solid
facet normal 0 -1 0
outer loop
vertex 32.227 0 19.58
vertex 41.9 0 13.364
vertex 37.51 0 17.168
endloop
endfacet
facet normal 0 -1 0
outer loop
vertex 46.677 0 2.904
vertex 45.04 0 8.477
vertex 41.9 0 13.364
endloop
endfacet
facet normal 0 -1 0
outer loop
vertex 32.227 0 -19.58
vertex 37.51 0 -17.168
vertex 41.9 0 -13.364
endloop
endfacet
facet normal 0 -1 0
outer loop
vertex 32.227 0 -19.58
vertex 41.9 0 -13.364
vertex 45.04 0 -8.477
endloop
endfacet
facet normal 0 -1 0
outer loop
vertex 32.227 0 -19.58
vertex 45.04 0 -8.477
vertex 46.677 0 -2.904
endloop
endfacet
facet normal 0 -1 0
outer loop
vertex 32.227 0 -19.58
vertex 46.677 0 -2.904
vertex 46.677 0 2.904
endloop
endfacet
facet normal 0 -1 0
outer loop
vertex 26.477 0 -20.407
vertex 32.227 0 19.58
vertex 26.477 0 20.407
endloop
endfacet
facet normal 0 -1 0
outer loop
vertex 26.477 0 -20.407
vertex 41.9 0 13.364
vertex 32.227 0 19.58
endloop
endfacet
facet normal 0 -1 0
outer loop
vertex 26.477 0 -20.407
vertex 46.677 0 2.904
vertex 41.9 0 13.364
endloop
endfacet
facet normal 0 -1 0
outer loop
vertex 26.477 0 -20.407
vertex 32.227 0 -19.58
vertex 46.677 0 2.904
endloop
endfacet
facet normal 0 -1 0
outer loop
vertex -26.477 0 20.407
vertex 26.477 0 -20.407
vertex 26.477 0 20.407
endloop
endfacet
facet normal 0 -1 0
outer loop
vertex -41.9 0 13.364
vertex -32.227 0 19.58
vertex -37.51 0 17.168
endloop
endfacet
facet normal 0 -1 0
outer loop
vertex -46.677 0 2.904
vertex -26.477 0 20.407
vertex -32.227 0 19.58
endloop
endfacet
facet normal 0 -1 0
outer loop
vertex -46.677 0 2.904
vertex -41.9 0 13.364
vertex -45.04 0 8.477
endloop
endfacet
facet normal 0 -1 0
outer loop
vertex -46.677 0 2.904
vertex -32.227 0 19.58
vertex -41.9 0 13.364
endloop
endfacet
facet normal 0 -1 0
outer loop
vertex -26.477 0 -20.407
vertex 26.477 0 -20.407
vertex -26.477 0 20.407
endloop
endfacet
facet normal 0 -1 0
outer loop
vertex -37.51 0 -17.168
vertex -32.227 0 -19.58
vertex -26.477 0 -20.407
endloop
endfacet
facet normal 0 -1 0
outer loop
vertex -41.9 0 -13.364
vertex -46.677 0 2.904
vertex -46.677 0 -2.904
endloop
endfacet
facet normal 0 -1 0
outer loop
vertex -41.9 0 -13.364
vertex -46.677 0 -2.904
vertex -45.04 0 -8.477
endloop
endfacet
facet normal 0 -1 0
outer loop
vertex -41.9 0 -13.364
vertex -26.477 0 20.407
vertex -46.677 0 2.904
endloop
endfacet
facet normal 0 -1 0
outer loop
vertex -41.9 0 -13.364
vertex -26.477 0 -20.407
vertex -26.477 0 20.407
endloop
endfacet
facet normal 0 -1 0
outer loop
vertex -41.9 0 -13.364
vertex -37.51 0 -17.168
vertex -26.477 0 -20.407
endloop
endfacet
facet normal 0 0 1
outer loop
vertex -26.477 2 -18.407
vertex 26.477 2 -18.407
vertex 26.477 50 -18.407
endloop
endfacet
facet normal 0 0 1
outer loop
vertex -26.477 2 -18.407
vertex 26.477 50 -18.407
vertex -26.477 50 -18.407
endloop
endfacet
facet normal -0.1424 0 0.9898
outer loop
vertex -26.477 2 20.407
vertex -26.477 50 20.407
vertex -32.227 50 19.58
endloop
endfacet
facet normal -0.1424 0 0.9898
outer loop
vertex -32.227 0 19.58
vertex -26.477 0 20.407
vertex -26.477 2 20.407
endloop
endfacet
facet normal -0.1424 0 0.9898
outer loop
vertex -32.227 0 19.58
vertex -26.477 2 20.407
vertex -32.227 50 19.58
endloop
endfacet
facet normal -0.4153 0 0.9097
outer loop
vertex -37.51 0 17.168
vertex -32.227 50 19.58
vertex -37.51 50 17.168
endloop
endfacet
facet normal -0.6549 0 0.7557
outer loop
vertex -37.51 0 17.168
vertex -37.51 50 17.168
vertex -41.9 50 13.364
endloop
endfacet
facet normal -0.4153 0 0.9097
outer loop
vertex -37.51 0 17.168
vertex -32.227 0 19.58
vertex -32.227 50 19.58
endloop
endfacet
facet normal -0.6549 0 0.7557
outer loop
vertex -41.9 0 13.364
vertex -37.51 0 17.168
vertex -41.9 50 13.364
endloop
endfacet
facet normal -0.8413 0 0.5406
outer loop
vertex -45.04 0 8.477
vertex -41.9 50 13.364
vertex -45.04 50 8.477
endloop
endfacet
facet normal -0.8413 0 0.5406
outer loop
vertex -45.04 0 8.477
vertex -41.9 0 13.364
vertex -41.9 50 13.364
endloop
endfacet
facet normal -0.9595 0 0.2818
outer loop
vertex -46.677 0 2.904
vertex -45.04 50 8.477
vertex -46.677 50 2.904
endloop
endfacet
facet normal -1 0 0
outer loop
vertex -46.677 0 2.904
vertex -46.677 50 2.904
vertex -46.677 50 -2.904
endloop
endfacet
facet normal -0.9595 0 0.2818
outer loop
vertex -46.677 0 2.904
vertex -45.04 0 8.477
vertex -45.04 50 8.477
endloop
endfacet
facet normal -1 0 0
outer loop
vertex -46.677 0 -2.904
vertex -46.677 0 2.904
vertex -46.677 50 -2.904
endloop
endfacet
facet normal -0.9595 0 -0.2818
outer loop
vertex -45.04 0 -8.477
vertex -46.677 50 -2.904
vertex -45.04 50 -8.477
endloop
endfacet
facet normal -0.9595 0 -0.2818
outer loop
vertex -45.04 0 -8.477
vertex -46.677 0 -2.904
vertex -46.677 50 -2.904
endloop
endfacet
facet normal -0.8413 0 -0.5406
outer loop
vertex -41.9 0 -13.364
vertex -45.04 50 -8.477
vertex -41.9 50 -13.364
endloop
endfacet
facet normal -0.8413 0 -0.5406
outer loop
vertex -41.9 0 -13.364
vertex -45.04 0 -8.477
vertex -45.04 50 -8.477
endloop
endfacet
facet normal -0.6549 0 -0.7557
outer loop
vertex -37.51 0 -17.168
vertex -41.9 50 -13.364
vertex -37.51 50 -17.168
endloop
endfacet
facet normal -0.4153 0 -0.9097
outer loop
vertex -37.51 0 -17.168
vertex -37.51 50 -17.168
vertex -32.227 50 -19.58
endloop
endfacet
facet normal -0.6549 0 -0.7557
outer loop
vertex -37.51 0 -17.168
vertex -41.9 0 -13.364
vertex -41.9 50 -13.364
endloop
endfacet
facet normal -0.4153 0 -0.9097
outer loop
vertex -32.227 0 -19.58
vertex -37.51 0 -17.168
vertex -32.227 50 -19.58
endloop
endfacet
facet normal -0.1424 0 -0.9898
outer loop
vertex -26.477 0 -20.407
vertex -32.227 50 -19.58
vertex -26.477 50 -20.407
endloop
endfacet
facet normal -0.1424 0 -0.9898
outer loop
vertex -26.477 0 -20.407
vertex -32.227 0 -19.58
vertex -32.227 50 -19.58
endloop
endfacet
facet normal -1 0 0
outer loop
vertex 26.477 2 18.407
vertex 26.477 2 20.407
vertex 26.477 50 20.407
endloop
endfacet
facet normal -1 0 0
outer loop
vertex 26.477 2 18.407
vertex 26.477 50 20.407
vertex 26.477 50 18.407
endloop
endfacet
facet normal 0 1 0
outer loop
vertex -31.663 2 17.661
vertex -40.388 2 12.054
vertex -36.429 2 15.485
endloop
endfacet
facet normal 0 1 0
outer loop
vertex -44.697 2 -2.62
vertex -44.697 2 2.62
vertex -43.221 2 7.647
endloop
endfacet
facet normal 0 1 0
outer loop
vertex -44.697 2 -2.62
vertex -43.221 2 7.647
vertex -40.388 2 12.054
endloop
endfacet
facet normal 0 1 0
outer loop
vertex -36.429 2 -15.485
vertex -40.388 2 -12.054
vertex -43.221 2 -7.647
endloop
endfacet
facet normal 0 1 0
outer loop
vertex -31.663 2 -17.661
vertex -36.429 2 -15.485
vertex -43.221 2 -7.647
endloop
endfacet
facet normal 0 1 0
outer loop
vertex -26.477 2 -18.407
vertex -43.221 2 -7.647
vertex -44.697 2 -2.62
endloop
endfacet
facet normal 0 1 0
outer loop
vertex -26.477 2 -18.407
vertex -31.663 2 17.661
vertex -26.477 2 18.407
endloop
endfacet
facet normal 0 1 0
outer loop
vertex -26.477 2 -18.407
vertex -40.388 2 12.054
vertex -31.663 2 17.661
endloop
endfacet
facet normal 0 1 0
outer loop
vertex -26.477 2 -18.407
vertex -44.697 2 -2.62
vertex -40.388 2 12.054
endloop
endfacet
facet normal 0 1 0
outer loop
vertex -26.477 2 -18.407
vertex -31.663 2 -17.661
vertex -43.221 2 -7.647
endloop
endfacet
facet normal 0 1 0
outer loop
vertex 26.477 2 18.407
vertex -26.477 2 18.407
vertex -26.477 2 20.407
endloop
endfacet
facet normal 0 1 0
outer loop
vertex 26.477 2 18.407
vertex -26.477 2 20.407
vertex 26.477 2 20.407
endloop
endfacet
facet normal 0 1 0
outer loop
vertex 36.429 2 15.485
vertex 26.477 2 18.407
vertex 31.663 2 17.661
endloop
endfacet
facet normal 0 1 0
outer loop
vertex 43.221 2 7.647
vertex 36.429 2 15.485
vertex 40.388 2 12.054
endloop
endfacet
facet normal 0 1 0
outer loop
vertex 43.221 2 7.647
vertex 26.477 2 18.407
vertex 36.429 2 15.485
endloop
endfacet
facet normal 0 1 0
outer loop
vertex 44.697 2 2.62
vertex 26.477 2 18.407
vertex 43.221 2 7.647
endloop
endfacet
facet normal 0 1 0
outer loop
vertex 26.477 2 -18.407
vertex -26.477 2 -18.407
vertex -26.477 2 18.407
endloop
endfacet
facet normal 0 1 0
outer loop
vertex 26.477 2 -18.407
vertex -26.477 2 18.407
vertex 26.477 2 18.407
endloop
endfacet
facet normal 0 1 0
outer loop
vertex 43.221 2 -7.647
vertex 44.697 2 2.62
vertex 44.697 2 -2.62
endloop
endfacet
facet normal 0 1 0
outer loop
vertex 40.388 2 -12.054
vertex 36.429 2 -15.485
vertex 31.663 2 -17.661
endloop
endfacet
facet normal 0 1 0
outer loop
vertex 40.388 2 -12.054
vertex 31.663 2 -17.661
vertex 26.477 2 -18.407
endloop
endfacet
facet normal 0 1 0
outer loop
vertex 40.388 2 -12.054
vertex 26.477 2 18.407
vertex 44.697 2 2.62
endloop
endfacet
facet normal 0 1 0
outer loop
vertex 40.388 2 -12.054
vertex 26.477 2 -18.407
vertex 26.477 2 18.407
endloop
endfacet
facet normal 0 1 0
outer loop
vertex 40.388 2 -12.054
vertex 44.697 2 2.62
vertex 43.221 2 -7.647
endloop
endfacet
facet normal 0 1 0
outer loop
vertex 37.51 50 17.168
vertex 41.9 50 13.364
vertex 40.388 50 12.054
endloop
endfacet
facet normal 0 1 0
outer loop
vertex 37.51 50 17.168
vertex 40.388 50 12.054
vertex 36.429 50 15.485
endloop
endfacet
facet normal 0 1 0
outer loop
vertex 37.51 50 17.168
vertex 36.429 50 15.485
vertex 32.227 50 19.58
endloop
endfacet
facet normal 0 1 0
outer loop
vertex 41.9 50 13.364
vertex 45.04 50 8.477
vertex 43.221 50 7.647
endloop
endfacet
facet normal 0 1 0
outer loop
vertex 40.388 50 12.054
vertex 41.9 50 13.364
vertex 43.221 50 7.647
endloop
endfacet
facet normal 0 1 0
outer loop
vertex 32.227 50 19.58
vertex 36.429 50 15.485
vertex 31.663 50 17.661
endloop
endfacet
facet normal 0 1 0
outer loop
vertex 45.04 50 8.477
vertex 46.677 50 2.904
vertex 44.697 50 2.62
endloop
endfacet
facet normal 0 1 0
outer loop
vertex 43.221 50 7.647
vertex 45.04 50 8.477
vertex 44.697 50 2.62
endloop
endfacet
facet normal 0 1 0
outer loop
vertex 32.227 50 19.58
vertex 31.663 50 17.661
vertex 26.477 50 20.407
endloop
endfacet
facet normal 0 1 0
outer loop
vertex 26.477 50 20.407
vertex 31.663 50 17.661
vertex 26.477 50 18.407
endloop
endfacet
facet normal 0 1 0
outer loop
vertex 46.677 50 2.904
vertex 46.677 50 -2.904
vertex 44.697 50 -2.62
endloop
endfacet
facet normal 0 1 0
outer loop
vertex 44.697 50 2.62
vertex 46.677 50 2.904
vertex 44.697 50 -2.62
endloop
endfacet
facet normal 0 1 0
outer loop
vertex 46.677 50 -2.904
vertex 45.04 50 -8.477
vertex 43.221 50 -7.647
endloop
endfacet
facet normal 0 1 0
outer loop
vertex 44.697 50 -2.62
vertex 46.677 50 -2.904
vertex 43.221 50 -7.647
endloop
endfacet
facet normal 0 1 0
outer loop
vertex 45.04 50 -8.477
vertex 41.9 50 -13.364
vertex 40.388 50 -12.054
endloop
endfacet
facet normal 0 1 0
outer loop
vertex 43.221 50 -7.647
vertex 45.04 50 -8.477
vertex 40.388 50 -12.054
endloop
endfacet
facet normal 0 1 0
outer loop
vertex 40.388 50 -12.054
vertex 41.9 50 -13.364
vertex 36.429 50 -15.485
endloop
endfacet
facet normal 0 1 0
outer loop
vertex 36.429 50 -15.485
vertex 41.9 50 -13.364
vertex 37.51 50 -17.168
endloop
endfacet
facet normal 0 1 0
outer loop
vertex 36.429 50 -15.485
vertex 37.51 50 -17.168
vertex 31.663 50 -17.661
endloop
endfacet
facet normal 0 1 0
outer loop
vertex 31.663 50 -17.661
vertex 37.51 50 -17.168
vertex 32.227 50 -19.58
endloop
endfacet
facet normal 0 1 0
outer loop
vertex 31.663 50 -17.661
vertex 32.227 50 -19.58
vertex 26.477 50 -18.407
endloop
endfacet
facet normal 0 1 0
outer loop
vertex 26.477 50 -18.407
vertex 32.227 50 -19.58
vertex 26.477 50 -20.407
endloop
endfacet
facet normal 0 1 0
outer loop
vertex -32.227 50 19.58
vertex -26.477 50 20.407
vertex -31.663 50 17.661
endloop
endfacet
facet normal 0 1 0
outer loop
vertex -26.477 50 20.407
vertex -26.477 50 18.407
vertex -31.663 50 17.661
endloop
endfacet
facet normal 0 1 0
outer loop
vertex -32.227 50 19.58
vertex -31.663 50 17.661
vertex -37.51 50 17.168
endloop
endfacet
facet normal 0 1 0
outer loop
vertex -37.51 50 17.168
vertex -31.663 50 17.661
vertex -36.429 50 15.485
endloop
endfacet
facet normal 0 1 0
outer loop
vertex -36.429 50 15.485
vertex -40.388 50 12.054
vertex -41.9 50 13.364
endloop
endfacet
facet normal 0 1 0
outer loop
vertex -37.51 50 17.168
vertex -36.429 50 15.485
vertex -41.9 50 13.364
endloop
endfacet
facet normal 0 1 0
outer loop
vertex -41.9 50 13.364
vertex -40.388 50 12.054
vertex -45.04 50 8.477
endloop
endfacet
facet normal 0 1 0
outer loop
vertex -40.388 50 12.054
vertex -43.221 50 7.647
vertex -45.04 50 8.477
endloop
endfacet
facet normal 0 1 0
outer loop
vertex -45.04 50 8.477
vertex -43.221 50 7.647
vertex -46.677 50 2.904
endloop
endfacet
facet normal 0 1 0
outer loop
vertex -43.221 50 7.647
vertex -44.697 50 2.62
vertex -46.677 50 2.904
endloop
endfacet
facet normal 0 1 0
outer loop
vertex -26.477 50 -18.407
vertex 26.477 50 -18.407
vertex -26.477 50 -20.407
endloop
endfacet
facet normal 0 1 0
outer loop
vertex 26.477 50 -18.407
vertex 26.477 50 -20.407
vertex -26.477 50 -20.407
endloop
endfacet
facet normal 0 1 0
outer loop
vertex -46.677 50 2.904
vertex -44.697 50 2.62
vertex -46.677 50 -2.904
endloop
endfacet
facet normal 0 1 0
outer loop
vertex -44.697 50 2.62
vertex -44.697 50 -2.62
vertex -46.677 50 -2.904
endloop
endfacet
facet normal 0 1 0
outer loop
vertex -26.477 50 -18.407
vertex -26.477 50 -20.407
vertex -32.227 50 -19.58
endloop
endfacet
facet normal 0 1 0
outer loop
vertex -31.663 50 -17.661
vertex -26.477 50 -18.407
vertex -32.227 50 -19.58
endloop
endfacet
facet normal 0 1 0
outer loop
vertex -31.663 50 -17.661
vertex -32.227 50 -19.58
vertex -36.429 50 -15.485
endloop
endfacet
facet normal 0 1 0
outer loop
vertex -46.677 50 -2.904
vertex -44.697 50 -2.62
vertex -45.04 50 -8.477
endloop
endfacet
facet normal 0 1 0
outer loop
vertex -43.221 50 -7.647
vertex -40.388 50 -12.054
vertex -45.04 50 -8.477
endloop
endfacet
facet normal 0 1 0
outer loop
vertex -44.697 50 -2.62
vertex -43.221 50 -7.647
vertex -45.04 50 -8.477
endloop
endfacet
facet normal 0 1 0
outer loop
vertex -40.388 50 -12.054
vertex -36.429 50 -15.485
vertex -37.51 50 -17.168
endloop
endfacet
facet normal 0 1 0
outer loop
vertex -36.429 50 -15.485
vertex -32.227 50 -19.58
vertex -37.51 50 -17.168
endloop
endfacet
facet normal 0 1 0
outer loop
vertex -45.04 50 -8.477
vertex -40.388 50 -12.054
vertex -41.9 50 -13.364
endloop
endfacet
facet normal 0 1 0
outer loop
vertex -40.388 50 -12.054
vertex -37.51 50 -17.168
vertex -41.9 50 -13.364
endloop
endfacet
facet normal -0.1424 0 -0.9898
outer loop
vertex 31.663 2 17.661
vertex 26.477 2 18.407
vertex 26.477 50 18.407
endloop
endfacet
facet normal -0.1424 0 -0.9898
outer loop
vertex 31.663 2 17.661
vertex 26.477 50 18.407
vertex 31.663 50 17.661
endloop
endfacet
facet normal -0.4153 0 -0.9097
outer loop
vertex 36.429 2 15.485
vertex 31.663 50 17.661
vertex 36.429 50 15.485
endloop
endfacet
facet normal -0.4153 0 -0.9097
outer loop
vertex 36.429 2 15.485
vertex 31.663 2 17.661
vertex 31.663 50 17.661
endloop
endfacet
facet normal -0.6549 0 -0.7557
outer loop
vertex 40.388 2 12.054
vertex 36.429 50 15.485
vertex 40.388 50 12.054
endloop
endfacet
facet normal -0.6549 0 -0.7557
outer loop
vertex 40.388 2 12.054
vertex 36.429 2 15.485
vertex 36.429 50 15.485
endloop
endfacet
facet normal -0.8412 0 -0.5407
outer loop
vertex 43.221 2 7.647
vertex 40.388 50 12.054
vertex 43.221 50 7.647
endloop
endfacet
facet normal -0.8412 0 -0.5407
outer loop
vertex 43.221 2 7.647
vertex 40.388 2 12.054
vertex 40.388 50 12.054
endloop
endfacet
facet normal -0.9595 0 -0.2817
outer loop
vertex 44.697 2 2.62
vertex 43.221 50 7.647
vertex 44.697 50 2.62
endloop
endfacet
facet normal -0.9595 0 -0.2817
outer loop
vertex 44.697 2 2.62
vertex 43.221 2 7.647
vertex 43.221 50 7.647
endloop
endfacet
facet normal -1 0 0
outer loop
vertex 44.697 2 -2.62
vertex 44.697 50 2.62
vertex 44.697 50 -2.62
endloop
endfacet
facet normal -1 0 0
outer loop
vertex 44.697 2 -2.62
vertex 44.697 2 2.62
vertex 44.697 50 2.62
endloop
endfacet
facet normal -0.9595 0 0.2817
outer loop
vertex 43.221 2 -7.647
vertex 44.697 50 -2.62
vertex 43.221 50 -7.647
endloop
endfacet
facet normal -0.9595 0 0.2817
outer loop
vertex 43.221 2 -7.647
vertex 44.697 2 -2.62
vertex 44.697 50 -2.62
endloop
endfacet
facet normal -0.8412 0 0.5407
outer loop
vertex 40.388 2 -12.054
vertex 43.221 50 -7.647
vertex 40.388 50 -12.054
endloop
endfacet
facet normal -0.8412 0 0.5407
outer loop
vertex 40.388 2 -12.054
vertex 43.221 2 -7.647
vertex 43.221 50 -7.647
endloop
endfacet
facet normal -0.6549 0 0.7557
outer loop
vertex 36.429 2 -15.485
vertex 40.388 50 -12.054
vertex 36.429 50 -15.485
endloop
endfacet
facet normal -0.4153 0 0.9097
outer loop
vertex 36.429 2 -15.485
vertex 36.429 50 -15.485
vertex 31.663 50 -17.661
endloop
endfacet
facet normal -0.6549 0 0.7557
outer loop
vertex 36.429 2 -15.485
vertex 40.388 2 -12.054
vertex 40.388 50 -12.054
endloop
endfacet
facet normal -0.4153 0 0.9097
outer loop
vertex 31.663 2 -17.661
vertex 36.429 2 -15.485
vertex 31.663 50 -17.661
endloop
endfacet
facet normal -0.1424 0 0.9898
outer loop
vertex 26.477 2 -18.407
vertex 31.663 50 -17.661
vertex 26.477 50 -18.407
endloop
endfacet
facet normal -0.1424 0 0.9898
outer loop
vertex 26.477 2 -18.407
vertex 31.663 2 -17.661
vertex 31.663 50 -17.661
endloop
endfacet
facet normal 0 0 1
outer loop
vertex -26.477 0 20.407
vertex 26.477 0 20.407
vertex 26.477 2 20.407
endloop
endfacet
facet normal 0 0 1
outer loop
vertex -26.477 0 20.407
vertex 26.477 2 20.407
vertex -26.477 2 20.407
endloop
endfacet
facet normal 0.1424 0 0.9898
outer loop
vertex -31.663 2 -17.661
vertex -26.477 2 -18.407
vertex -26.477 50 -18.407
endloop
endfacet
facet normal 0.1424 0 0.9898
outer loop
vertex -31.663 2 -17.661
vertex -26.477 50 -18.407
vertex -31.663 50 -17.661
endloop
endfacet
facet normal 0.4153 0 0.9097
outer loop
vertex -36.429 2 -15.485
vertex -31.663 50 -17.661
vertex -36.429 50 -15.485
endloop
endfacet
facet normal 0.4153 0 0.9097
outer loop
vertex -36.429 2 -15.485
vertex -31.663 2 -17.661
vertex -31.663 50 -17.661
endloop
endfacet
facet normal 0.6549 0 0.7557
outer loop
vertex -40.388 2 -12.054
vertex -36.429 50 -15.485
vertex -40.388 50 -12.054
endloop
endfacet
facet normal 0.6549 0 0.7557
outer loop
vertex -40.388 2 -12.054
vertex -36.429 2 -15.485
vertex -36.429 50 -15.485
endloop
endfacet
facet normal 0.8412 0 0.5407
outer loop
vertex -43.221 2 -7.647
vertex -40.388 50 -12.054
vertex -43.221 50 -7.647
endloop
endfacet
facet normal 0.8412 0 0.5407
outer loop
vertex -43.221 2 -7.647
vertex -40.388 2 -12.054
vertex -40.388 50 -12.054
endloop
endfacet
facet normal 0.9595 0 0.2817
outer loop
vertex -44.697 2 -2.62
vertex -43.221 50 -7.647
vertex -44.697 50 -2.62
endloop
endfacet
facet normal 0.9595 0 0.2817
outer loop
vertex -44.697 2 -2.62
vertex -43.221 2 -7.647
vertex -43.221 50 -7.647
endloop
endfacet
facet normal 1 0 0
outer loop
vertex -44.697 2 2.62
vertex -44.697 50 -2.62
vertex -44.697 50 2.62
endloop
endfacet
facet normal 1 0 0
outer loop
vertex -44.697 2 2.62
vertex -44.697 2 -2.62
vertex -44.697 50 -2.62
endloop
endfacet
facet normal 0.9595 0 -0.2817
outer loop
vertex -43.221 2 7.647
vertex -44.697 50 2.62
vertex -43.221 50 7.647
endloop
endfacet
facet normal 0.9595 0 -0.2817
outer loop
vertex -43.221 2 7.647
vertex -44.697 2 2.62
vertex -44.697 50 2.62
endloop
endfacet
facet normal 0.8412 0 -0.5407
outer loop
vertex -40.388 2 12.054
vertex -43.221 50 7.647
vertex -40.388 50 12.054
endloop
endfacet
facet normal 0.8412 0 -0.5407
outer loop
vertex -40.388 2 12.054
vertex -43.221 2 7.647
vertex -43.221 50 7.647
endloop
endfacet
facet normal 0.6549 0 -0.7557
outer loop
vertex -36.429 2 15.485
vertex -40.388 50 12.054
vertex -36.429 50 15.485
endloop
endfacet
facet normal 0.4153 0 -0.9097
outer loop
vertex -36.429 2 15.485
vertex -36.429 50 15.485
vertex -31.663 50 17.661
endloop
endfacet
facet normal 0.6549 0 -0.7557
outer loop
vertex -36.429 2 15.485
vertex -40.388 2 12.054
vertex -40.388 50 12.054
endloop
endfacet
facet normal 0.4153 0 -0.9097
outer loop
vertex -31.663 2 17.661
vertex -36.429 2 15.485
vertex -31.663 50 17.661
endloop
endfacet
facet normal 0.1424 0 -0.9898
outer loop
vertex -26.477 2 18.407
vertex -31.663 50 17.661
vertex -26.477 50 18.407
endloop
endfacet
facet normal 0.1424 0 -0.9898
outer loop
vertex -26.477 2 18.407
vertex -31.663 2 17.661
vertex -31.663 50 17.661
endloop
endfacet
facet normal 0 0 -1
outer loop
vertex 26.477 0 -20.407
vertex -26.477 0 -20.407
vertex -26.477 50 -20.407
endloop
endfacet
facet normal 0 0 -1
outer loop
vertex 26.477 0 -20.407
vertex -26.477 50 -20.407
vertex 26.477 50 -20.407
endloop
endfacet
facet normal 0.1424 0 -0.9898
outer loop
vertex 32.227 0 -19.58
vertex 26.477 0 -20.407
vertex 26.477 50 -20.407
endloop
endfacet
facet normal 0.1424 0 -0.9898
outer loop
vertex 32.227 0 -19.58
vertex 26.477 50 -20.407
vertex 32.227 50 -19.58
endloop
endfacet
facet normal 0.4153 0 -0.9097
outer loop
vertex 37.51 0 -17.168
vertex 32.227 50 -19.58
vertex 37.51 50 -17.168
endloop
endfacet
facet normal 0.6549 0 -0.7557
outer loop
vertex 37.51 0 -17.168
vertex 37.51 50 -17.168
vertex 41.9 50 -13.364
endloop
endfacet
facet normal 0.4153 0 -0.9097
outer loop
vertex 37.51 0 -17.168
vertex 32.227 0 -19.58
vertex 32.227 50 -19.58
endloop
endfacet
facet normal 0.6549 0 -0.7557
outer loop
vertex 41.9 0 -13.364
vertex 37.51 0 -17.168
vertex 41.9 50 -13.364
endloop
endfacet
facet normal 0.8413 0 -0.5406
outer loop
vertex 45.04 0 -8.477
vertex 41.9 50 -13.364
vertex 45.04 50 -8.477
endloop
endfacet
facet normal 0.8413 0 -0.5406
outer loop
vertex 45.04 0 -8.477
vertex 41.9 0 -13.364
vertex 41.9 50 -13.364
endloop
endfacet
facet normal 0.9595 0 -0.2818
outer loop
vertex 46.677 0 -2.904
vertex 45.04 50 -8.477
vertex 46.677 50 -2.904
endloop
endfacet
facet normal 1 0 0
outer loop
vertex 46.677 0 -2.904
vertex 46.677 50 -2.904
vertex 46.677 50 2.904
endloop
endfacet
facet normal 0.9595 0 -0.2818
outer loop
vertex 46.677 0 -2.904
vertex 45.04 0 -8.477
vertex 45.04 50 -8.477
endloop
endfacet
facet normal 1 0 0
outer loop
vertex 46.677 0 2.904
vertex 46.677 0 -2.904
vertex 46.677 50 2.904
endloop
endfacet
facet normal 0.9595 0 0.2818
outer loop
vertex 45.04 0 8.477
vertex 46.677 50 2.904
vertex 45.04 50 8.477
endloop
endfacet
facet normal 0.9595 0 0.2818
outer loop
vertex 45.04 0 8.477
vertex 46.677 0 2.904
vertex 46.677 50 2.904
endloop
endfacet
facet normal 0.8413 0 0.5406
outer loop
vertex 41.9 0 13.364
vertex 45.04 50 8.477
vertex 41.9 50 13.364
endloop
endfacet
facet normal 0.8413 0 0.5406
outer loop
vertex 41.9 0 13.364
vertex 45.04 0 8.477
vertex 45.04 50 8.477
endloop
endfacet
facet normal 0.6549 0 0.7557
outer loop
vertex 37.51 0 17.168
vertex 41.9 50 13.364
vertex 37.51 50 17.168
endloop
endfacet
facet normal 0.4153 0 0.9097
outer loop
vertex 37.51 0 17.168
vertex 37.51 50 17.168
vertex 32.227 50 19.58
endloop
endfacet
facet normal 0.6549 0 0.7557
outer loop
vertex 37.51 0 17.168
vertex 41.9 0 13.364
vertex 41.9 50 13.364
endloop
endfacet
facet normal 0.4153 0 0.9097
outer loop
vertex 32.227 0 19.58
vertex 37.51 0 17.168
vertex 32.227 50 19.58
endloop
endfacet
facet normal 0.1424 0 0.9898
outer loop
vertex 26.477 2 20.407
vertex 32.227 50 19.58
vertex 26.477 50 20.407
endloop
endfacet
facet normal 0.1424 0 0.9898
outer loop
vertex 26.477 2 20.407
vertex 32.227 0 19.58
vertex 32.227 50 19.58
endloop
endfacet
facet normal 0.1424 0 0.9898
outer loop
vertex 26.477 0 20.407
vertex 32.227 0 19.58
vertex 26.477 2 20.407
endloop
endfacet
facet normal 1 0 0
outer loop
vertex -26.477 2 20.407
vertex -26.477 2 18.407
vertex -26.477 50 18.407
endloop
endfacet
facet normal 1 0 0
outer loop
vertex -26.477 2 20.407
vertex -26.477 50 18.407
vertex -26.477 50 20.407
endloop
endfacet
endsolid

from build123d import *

# Parameters (mm, degrees)
BOSS_EXTRUDE1_DEPTH = 50
SHELL2_START        = 2
SHELL2_DEPTH        = 48


# Read off the part's stored shape, not the designer's step: Shell2
with BuildPart() as part:
    # Sketch1 → Boss-Extrude1 (new body)
    with BuildSketch(Plane(origin=(0, 0, 0), x_dir=(1, 0, 0), z_dir=(0, 1, 0))):
        with BuildLine():
            Line((-26.477298014, 20.407046949), (26.477298014, 20.407046949))
            ThreePointArc((26.477298014, 20.407046949), (46.884344963, 0), (26.477298014, -20.407046949))
            Line((26.477298014, -20.407046949), (-26.477298014, -20.407046949))
            ThreePointArc((-26.477298014, -20.407046949), (-46.884344963, 0), (-26.477298014, 20.407046949))
        make_face()
    extrude(amount=BOSS_EXTRUDE1_DEPTH)

    # Shell2 outline → Shell2 (cut)
    with BuildSketch(Plane(origin=(0, 0, 0), x_dir=(1, 0, 0), z_dir=(0, 1, 0)).offset(SHELL2_START)):
        with BuildLine():
            Line((-26.477298014, -18.407046949), (-26.477298014, -20.407046949))
            Line((-26.477298014, -20.407046949), (26.477298014, -20.407046949))
            Line((26.477298014, -20.407046949), (26.477298014, -18.407046949))
            ThreePointArc((26.477298014, -18.407046949), (44.884344963, 0), (26.477298014, 18.407046949))
            Line((26.477298014, 18.407046949), (-26.477298014, 18.407046949))
            ThreePointArc((-26.477298014, 18.407046949), (-44.884344963, 0), (-26.477298014, -18.407046949))
        make_face()
    extrude(amount=SHELL2_DEPTH, mode=Mode.SUBTRACT)


solid = part.part
